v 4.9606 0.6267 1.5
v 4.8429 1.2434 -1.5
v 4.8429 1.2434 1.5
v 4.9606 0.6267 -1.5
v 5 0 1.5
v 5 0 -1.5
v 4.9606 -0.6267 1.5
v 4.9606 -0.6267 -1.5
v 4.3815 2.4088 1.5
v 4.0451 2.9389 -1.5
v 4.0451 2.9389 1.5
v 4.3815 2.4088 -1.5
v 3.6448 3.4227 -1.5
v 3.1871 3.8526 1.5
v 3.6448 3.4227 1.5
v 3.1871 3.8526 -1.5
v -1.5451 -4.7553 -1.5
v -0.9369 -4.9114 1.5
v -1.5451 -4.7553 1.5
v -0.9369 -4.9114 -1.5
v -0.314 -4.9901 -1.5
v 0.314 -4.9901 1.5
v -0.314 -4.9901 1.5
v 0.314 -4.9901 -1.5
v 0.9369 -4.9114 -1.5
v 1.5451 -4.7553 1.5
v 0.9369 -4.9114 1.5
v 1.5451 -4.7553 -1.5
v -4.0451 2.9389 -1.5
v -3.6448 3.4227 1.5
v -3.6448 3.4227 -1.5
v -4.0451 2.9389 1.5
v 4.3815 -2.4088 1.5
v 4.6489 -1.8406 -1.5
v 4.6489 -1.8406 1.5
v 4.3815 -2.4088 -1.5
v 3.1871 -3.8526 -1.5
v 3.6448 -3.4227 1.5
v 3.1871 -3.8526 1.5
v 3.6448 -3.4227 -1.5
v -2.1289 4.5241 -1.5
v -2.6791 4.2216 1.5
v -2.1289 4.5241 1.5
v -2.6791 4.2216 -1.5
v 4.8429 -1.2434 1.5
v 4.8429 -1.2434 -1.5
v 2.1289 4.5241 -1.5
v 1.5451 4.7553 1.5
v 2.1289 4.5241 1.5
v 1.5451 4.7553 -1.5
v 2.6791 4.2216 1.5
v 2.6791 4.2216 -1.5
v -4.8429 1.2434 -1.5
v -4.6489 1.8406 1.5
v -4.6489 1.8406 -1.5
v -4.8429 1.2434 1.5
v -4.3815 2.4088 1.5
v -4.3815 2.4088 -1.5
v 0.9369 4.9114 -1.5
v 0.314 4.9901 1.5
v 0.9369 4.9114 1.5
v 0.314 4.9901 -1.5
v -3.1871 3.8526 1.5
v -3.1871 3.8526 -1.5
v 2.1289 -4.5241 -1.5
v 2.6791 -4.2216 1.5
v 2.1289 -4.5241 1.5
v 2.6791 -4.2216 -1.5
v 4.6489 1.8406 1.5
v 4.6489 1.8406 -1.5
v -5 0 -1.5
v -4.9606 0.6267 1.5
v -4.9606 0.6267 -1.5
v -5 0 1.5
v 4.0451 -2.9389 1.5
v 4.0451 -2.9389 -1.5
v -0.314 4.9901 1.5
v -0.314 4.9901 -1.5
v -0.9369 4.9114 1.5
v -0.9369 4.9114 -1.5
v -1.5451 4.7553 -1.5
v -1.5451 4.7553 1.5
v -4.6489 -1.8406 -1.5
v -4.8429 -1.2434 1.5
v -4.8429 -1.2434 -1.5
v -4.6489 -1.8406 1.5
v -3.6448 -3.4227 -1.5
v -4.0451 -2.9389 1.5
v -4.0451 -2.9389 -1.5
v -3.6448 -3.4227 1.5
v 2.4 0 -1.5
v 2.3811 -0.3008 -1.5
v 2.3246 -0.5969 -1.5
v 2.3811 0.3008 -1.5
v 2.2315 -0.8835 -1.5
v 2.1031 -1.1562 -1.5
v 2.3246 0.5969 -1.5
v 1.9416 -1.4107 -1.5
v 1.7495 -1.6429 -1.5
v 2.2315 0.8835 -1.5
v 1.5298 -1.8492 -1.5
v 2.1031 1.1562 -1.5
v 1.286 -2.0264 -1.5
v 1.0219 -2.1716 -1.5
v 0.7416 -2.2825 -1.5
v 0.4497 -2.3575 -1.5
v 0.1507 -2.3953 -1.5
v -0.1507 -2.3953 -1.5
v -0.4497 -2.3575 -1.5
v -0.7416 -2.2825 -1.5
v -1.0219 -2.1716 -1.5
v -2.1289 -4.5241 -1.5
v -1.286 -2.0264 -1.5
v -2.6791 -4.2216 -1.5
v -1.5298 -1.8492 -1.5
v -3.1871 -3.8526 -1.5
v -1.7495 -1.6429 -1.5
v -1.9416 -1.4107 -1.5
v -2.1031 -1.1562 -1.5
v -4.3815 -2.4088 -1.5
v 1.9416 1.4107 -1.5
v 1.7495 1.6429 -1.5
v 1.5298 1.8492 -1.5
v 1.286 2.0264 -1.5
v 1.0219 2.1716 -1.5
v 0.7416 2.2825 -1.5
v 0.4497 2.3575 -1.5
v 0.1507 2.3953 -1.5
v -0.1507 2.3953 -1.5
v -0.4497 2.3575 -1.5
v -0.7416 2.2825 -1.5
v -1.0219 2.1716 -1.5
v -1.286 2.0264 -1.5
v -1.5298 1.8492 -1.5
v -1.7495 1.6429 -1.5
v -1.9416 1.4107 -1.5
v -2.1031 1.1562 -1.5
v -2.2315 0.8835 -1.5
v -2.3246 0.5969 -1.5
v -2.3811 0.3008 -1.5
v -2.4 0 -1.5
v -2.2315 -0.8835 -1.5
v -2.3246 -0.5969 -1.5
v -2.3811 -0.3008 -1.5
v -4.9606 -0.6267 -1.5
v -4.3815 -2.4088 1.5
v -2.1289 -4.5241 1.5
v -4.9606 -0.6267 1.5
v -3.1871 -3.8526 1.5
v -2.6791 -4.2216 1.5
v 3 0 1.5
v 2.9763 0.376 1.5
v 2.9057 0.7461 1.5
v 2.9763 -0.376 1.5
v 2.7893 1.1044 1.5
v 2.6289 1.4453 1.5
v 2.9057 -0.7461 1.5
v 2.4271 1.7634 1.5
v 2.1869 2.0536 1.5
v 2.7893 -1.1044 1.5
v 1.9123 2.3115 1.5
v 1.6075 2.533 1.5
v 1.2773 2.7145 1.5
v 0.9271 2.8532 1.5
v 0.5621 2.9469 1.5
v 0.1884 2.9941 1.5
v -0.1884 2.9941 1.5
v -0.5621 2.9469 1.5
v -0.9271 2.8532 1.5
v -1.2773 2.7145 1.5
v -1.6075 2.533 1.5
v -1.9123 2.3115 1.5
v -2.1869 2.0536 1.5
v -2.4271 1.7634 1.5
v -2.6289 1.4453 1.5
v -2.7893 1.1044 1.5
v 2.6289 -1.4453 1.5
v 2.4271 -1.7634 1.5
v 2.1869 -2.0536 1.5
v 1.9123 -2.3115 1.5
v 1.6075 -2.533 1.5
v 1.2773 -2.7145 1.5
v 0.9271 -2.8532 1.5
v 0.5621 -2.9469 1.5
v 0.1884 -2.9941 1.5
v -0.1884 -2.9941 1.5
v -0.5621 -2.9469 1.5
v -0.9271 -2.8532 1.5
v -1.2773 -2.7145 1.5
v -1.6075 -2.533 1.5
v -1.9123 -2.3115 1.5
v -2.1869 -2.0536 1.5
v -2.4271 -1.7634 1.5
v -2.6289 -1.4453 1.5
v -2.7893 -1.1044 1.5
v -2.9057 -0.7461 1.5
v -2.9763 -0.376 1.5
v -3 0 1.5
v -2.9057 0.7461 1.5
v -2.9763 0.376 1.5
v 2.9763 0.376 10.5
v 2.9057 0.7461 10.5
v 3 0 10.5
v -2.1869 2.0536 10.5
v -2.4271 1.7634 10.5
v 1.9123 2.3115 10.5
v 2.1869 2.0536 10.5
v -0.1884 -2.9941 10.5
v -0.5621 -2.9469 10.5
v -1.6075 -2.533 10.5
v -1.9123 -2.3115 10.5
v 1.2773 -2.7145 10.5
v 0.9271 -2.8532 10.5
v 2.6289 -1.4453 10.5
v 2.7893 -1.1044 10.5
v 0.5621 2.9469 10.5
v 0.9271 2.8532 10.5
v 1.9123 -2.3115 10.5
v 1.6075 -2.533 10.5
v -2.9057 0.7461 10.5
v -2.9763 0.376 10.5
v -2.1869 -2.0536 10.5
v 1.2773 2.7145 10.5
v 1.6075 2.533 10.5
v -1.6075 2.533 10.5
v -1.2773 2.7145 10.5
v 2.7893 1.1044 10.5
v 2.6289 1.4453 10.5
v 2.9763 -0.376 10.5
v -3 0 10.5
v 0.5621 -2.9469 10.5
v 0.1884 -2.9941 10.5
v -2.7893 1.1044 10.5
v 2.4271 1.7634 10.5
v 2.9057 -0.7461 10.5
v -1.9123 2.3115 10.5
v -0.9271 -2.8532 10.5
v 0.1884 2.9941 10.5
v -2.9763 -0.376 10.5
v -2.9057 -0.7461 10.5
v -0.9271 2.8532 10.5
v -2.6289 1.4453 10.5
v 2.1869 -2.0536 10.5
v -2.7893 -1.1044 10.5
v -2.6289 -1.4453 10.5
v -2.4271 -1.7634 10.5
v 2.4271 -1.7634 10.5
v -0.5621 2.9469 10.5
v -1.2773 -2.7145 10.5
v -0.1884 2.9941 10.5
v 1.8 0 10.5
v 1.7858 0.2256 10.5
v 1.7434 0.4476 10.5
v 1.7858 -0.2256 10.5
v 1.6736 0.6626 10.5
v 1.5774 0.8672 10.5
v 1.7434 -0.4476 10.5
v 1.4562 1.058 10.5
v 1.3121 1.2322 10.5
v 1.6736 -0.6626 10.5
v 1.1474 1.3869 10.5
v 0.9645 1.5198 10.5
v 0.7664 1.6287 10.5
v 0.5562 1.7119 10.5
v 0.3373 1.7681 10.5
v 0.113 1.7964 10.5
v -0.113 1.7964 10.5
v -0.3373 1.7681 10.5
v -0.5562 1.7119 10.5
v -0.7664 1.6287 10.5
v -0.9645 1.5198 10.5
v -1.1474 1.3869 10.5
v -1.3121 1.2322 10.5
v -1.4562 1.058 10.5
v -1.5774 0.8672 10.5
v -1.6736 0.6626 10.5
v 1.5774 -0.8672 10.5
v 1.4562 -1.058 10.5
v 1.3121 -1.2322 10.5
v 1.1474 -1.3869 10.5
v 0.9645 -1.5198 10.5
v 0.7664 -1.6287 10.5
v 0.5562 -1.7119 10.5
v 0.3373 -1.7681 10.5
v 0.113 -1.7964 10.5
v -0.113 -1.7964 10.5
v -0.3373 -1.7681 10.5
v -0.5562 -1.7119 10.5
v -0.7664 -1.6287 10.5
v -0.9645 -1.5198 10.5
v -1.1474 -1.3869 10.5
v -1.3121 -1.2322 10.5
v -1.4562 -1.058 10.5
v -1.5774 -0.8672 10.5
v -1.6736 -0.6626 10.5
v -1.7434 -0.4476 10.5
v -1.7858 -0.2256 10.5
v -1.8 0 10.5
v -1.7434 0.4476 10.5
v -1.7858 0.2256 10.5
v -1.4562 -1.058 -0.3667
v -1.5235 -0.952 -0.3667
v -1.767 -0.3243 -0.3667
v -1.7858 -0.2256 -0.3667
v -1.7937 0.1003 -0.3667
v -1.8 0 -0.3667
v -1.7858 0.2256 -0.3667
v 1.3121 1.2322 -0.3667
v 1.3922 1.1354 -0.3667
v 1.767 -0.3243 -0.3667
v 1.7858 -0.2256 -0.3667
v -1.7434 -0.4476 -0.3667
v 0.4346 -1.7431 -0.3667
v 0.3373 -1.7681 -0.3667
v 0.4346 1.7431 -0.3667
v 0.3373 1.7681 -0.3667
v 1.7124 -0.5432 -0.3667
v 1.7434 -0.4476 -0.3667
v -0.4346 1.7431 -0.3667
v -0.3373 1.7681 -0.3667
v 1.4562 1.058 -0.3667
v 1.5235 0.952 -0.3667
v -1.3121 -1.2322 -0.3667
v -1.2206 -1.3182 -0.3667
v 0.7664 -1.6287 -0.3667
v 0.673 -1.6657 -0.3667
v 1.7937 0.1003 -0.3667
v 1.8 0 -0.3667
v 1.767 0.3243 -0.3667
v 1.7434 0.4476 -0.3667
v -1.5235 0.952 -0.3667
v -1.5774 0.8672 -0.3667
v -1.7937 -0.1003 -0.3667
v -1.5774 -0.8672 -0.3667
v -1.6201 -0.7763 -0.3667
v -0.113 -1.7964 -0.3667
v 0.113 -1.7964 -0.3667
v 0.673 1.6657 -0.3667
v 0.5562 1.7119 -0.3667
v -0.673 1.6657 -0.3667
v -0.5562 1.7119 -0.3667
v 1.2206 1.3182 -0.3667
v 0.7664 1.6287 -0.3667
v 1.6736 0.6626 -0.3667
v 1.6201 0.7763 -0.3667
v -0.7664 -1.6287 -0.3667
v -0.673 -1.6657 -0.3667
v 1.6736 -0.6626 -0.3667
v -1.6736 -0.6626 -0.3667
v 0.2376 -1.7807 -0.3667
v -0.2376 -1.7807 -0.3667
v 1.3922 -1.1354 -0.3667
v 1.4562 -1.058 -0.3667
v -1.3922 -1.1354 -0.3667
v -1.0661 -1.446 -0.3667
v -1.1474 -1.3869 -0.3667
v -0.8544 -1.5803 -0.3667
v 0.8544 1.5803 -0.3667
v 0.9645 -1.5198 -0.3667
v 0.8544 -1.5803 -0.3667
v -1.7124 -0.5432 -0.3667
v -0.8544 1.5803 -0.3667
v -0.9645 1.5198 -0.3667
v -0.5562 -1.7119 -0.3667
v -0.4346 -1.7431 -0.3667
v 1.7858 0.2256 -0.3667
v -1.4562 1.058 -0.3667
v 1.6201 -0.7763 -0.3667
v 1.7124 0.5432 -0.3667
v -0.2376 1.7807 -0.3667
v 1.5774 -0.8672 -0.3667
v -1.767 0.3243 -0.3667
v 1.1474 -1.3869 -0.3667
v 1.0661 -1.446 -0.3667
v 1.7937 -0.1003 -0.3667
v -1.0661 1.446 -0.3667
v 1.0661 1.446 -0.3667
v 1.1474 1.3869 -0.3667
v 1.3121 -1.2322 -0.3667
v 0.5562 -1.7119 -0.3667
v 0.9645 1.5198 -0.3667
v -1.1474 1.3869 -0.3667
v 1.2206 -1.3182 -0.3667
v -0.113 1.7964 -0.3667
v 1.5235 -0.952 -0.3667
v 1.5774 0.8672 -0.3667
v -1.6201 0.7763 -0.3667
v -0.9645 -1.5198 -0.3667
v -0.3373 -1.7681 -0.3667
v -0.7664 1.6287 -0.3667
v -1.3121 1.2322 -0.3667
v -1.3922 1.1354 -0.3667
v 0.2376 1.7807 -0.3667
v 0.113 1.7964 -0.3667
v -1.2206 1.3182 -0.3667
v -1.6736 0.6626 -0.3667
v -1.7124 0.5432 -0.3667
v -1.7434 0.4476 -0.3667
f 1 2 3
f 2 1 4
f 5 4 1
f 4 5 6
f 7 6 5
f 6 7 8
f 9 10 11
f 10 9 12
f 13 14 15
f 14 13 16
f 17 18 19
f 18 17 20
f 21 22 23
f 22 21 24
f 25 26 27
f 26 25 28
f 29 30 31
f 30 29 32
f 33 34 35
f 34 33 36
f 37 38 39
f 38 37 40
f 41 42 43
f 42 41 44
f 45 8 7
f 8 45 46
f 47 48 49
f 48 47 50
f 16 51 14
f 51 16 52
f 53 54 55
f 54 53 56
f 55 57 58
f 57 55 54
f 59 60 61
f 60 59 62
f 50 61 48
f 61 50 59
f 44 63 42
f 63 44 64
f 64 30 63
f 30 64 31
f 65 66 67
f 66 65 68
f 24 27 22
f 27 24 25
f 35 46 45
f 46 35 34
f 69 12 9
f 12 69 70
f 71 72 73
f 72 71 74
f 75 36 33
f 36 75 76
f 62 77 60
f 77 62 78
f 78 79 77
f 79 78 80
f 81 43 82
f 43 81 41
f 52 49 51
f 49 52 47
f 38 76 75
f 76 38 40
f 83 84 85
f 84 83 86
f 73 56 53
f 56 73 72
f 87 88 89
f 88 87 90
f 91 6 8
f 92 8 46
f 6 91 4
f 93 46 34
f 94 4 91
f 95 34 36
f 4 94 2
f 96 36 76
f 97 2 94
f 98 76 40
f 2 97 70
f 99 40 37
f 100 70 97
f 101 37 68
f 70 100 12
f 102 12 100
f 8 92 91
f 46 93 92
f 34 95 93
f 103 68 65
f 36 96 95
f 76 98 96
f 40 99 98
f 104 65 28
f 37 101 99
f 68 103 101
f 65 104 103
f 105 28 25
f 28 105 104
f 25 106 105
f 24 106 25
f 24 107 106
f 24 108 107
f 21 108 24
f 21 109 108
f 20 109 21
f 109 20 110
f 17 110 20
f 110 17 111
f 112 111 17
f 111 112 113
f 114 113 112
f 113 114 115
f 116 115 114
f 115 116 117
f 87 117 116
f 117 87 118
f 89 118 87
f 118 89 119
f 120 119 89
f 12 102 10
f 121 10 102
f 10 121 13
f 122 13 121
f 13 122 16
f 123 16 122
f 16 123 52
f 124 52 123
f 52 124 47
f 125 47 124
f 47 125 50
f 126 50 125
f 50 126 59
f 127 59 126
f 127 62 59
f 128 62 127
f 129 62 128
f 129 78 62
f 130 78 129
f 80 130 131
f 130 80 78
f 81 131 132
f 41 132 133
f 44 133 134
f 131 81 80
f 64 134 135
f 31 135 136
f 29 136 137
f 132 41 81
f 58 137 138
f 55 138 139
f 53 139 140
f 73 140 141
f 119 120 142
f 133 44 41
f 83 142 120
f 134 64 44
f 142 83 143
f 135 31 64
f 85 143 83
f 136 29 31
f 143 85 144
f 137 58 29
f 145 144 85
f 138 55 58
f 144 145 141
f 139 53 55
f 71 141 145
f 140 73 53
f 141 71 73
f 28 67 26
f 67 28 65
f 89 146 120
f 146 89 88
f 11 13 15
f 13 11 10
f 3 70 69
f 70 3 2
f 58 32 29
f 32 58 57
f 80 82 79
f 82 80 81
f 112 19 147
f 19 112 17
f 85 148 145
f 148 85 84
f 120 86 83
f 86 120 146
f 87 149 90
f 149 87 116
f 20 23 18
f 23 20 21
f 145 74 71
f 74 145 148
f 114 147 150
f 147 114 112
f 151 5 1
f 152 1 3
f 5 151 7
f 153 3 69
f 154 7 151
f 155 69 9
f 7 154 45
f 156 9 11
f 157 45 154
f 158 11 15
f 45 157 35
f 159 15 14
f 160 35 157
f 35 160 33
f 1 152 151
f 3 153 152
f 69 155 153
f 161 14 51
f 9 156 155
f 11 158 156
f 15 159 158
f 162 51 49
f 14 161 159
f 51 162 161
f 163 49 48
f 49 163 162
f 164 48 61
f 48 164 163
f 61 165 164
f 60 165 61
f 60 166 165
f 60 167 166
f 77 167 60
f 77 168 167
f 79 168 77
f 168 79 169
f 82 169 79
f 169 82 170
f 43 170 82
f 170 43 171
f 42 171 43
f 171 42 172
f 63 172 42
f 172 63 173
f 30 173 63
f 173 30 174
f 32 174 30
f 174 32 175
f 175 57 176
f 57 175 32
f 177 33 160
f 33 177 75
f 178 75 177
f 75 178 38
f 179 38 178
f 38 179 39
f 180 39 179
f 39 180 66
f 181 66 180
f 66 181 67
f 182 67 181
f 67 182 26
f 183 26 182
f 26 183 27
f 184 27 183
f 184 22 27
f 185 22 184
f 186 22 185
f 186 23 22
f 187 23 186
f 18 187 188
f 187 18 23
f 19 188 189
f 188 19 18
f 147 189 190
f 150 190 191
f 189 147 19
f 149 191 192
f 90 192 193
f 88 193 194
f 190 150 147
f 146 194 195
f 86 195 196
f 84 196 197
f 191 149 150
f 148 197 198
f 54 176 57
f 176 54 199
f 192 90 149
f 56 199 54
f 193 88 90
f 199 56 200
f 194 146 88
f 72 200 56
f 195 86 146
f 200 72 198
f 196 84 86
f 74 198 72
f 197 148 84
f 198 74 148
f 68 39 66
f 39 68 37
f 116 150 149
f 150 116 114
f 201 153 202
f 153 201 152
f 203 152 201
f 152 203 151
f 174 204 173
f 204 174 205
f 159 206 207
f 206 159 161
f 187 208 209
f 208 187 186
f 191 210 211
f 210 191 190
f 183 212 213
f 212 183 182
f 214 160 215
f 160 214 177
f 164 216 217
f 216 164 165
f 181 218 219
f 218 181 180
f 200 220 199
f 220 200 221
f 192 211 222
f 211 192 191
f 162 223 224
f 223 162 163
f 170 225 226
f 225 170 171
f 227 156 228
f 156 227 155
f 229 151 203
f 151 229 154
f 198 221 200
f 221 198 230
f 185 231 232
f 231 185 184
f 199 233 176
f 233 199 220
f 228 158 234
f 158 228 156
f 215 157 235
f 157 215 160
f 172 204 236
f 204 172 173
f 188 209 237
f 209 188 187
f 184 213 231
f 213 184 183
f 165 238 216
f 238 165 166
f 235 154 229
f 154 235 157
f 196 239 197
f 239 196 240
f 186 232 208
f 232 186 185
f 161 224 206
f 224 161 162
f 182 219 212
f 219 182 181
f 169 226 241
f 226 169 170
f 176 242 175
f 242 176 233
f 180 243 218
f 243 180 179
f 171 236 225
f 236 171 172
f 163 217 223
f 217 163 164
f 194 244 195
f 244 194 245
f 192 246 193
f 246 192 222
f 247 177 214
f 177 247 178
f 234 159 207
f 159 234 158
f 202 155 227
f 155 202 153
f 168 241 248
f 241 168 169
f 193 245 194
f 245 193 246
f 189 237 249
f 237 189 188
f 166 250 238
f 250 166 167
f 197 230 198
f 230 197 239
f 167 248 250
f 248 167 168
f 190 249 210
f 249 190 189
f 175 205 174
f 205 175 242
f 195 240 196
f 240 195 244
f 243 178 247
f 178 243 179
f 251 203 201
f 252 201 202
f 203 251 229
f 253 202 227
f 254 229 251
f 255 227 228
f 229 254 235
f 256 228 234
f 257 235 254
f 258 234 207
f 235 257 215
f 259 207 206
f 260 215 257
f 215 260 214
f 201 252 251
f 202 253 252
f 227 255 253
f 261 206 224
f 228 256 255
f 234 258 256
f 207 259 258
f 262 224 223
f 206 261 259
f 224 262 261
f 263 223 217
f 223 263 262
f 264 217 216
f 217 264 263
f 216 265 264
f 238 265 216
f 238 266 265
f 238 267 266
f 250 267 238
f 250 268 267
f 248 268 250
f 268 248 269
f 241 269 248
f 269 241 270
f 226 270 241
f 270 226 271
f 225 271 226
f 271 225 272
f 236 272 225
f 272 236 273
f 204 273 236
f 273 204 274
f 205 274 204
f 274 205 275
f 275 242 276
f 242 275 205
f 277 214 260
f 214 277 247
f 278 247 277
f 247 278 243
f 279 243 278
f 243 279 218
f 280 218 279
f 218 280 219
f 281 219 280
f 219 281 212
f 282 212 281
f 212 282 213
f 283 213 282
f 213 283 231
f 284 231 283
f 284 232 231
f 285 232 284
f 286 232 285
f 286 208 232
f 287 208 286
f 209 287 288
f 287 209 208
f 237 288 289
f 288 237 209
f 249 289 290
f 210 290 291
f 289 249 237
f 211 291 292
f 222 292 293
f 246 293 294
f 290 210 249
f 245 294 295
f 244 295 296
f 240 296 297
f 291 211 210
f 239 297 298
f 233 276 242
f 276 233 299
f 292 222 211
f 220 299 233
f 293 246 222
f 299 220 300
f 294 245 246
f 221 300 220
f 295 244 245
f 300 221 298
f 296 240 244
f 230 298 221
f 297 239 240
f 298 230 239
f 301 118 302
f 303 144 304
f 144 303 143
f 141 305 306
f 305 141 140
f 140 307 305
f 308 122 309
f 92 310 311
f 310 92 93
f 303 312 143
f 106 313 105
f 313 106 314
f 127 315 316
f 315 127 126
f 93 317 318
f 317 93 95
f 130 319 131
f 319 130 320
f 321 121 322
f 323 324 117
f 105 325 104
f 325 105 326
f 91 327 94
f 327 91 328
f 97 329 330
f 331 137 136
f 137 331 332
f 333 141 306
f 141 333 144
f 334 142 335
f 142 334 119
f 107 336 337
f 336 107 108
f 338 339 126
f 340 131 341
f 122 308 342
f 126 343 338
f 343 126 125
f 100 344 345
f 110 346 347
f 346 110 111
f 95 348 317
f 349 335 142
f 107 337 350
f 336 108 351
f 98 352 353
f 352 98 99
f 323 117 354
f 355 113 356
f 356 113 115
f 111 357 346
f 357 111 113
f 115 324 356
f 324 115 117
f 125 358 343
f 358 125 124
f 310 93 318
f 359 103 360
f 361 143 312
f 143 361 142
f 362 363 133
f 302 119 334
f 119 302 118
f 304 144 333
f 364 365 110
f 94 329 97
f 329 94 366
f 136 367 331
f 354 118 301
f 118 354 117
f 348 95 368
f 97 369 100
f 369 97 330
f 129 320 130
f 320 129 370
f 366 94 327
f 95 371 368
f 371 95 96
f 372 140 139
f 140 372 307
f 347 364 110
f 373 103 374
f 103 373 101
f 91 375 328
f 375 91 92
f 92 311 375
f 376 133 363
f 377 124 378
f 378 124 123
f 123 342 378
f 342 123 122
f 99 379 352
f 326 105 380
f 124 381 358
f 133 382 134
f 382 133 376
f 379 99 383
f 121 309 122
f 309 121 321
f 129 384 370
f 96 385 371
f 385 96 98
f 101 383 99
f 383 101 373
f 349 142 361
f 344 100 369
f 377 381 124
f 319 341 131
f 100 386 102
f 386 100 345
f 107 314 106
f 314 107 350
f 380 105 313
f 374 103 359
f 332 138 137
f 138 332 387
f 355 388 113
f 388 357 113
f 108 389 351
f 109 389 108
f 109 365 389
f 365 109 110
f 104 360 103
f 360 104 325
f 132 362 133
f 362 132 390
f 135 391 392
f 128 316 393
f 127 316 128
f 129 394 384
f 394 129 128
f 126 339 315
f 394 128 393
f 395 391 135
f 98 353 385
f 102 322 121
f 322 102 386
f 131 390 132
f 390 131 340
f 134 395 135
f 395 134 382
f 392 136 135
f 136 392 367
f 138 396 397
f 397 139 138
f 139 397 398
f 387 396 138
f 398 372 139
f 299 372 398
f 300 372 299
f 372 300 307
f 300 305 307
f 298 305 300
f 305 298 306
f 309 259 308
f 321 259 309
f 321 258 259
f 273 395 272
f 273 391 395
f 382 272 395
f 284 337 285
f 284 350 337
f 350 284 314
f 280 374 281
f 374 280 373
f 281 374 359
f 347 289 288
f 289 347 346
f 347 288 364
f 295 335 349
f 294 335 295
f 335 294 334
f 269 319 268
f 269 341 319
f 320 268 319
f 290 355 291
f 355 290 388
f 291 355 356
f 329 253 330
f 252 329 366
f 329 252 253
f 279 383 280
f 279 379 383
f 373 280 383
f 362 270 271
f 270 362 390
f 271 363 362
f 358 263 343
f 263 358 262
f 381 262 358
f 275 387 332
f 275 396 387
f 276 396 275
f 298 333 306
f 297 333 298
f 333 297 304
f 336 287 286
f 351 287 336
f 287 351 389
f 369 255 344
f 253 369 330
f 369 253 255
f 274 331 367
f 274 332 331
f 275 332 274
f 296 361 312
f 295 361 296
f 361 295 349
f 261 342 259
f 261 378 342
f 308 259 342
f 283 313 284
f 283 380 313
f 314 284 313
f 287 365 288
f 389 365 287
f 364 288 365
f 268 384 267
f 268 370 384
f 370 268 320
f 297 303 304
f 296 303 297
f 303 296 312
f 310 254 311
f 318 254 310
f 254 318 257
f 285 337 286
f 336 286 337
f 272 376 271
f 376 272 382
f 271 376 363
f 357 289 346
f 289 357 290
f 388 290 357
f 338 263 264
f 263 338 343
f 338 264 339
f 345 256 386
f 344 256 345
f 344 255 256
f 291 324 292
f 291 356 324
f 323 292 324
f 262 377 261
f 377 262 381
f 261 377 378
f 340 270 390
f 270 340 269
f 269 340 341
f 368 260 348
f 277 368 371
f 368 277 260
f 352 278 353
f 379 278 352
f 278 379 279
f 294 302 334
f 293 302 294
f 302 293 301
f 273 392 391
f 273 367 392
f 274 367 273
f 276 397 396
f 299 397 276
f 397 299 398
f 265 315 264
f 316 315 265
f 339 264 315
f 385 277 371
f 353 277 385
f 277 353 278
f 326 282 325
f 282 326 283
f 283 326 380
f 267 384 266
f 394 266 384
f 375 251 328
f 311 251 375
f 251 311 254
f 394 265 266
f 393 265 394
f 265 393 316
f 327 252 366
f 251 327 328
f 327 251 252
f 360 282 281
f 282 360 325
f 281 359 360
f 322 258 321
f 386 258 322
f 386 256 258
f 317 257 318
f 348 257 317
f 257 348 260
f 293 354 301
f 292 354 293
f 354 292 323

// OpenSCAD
$fn = 50;


difference() {
	union() {
		translate(v = [0, 0, -1.5000000000]) {
			cylinder(h = 3, r = 5.0000000000);
		}
		translate(v = [0, 0, -1.5000000000]) {
			cylinder(h = 12, r = 3.0000000000);
		}
	}
	union() {
		translate(v = [0, 0, -1.5000000000]) {
			rotate(a = [0, 180, 0]) {
				difference() {
					union() {
						translate(v = [0, 0, -1.7000000000]) {
							cylinder(h = 1.7000000000, r1 = 1.5000000000, r2 = 2.4000000000);
						}
						translate(v = [0, 0, -12.0000000000]) {
							cylinder(h = 12, r = 1.5000000000);
						}
						translate(v = [0, 0, -12.0000000000]) {
							cylinder(h = 12, r = 1.8000000000);
						}
						translate(v = [0, 0, -12.0000000000]) {
							cylinder(h = 12, r = 1.5000000000);
						}
					}
					union();
				}
			}
		}
		translate(v = [0, 0, -50.0000000000]) {
			cylinder(h = 100, r = 1.5000000000);
		}
	}
}
